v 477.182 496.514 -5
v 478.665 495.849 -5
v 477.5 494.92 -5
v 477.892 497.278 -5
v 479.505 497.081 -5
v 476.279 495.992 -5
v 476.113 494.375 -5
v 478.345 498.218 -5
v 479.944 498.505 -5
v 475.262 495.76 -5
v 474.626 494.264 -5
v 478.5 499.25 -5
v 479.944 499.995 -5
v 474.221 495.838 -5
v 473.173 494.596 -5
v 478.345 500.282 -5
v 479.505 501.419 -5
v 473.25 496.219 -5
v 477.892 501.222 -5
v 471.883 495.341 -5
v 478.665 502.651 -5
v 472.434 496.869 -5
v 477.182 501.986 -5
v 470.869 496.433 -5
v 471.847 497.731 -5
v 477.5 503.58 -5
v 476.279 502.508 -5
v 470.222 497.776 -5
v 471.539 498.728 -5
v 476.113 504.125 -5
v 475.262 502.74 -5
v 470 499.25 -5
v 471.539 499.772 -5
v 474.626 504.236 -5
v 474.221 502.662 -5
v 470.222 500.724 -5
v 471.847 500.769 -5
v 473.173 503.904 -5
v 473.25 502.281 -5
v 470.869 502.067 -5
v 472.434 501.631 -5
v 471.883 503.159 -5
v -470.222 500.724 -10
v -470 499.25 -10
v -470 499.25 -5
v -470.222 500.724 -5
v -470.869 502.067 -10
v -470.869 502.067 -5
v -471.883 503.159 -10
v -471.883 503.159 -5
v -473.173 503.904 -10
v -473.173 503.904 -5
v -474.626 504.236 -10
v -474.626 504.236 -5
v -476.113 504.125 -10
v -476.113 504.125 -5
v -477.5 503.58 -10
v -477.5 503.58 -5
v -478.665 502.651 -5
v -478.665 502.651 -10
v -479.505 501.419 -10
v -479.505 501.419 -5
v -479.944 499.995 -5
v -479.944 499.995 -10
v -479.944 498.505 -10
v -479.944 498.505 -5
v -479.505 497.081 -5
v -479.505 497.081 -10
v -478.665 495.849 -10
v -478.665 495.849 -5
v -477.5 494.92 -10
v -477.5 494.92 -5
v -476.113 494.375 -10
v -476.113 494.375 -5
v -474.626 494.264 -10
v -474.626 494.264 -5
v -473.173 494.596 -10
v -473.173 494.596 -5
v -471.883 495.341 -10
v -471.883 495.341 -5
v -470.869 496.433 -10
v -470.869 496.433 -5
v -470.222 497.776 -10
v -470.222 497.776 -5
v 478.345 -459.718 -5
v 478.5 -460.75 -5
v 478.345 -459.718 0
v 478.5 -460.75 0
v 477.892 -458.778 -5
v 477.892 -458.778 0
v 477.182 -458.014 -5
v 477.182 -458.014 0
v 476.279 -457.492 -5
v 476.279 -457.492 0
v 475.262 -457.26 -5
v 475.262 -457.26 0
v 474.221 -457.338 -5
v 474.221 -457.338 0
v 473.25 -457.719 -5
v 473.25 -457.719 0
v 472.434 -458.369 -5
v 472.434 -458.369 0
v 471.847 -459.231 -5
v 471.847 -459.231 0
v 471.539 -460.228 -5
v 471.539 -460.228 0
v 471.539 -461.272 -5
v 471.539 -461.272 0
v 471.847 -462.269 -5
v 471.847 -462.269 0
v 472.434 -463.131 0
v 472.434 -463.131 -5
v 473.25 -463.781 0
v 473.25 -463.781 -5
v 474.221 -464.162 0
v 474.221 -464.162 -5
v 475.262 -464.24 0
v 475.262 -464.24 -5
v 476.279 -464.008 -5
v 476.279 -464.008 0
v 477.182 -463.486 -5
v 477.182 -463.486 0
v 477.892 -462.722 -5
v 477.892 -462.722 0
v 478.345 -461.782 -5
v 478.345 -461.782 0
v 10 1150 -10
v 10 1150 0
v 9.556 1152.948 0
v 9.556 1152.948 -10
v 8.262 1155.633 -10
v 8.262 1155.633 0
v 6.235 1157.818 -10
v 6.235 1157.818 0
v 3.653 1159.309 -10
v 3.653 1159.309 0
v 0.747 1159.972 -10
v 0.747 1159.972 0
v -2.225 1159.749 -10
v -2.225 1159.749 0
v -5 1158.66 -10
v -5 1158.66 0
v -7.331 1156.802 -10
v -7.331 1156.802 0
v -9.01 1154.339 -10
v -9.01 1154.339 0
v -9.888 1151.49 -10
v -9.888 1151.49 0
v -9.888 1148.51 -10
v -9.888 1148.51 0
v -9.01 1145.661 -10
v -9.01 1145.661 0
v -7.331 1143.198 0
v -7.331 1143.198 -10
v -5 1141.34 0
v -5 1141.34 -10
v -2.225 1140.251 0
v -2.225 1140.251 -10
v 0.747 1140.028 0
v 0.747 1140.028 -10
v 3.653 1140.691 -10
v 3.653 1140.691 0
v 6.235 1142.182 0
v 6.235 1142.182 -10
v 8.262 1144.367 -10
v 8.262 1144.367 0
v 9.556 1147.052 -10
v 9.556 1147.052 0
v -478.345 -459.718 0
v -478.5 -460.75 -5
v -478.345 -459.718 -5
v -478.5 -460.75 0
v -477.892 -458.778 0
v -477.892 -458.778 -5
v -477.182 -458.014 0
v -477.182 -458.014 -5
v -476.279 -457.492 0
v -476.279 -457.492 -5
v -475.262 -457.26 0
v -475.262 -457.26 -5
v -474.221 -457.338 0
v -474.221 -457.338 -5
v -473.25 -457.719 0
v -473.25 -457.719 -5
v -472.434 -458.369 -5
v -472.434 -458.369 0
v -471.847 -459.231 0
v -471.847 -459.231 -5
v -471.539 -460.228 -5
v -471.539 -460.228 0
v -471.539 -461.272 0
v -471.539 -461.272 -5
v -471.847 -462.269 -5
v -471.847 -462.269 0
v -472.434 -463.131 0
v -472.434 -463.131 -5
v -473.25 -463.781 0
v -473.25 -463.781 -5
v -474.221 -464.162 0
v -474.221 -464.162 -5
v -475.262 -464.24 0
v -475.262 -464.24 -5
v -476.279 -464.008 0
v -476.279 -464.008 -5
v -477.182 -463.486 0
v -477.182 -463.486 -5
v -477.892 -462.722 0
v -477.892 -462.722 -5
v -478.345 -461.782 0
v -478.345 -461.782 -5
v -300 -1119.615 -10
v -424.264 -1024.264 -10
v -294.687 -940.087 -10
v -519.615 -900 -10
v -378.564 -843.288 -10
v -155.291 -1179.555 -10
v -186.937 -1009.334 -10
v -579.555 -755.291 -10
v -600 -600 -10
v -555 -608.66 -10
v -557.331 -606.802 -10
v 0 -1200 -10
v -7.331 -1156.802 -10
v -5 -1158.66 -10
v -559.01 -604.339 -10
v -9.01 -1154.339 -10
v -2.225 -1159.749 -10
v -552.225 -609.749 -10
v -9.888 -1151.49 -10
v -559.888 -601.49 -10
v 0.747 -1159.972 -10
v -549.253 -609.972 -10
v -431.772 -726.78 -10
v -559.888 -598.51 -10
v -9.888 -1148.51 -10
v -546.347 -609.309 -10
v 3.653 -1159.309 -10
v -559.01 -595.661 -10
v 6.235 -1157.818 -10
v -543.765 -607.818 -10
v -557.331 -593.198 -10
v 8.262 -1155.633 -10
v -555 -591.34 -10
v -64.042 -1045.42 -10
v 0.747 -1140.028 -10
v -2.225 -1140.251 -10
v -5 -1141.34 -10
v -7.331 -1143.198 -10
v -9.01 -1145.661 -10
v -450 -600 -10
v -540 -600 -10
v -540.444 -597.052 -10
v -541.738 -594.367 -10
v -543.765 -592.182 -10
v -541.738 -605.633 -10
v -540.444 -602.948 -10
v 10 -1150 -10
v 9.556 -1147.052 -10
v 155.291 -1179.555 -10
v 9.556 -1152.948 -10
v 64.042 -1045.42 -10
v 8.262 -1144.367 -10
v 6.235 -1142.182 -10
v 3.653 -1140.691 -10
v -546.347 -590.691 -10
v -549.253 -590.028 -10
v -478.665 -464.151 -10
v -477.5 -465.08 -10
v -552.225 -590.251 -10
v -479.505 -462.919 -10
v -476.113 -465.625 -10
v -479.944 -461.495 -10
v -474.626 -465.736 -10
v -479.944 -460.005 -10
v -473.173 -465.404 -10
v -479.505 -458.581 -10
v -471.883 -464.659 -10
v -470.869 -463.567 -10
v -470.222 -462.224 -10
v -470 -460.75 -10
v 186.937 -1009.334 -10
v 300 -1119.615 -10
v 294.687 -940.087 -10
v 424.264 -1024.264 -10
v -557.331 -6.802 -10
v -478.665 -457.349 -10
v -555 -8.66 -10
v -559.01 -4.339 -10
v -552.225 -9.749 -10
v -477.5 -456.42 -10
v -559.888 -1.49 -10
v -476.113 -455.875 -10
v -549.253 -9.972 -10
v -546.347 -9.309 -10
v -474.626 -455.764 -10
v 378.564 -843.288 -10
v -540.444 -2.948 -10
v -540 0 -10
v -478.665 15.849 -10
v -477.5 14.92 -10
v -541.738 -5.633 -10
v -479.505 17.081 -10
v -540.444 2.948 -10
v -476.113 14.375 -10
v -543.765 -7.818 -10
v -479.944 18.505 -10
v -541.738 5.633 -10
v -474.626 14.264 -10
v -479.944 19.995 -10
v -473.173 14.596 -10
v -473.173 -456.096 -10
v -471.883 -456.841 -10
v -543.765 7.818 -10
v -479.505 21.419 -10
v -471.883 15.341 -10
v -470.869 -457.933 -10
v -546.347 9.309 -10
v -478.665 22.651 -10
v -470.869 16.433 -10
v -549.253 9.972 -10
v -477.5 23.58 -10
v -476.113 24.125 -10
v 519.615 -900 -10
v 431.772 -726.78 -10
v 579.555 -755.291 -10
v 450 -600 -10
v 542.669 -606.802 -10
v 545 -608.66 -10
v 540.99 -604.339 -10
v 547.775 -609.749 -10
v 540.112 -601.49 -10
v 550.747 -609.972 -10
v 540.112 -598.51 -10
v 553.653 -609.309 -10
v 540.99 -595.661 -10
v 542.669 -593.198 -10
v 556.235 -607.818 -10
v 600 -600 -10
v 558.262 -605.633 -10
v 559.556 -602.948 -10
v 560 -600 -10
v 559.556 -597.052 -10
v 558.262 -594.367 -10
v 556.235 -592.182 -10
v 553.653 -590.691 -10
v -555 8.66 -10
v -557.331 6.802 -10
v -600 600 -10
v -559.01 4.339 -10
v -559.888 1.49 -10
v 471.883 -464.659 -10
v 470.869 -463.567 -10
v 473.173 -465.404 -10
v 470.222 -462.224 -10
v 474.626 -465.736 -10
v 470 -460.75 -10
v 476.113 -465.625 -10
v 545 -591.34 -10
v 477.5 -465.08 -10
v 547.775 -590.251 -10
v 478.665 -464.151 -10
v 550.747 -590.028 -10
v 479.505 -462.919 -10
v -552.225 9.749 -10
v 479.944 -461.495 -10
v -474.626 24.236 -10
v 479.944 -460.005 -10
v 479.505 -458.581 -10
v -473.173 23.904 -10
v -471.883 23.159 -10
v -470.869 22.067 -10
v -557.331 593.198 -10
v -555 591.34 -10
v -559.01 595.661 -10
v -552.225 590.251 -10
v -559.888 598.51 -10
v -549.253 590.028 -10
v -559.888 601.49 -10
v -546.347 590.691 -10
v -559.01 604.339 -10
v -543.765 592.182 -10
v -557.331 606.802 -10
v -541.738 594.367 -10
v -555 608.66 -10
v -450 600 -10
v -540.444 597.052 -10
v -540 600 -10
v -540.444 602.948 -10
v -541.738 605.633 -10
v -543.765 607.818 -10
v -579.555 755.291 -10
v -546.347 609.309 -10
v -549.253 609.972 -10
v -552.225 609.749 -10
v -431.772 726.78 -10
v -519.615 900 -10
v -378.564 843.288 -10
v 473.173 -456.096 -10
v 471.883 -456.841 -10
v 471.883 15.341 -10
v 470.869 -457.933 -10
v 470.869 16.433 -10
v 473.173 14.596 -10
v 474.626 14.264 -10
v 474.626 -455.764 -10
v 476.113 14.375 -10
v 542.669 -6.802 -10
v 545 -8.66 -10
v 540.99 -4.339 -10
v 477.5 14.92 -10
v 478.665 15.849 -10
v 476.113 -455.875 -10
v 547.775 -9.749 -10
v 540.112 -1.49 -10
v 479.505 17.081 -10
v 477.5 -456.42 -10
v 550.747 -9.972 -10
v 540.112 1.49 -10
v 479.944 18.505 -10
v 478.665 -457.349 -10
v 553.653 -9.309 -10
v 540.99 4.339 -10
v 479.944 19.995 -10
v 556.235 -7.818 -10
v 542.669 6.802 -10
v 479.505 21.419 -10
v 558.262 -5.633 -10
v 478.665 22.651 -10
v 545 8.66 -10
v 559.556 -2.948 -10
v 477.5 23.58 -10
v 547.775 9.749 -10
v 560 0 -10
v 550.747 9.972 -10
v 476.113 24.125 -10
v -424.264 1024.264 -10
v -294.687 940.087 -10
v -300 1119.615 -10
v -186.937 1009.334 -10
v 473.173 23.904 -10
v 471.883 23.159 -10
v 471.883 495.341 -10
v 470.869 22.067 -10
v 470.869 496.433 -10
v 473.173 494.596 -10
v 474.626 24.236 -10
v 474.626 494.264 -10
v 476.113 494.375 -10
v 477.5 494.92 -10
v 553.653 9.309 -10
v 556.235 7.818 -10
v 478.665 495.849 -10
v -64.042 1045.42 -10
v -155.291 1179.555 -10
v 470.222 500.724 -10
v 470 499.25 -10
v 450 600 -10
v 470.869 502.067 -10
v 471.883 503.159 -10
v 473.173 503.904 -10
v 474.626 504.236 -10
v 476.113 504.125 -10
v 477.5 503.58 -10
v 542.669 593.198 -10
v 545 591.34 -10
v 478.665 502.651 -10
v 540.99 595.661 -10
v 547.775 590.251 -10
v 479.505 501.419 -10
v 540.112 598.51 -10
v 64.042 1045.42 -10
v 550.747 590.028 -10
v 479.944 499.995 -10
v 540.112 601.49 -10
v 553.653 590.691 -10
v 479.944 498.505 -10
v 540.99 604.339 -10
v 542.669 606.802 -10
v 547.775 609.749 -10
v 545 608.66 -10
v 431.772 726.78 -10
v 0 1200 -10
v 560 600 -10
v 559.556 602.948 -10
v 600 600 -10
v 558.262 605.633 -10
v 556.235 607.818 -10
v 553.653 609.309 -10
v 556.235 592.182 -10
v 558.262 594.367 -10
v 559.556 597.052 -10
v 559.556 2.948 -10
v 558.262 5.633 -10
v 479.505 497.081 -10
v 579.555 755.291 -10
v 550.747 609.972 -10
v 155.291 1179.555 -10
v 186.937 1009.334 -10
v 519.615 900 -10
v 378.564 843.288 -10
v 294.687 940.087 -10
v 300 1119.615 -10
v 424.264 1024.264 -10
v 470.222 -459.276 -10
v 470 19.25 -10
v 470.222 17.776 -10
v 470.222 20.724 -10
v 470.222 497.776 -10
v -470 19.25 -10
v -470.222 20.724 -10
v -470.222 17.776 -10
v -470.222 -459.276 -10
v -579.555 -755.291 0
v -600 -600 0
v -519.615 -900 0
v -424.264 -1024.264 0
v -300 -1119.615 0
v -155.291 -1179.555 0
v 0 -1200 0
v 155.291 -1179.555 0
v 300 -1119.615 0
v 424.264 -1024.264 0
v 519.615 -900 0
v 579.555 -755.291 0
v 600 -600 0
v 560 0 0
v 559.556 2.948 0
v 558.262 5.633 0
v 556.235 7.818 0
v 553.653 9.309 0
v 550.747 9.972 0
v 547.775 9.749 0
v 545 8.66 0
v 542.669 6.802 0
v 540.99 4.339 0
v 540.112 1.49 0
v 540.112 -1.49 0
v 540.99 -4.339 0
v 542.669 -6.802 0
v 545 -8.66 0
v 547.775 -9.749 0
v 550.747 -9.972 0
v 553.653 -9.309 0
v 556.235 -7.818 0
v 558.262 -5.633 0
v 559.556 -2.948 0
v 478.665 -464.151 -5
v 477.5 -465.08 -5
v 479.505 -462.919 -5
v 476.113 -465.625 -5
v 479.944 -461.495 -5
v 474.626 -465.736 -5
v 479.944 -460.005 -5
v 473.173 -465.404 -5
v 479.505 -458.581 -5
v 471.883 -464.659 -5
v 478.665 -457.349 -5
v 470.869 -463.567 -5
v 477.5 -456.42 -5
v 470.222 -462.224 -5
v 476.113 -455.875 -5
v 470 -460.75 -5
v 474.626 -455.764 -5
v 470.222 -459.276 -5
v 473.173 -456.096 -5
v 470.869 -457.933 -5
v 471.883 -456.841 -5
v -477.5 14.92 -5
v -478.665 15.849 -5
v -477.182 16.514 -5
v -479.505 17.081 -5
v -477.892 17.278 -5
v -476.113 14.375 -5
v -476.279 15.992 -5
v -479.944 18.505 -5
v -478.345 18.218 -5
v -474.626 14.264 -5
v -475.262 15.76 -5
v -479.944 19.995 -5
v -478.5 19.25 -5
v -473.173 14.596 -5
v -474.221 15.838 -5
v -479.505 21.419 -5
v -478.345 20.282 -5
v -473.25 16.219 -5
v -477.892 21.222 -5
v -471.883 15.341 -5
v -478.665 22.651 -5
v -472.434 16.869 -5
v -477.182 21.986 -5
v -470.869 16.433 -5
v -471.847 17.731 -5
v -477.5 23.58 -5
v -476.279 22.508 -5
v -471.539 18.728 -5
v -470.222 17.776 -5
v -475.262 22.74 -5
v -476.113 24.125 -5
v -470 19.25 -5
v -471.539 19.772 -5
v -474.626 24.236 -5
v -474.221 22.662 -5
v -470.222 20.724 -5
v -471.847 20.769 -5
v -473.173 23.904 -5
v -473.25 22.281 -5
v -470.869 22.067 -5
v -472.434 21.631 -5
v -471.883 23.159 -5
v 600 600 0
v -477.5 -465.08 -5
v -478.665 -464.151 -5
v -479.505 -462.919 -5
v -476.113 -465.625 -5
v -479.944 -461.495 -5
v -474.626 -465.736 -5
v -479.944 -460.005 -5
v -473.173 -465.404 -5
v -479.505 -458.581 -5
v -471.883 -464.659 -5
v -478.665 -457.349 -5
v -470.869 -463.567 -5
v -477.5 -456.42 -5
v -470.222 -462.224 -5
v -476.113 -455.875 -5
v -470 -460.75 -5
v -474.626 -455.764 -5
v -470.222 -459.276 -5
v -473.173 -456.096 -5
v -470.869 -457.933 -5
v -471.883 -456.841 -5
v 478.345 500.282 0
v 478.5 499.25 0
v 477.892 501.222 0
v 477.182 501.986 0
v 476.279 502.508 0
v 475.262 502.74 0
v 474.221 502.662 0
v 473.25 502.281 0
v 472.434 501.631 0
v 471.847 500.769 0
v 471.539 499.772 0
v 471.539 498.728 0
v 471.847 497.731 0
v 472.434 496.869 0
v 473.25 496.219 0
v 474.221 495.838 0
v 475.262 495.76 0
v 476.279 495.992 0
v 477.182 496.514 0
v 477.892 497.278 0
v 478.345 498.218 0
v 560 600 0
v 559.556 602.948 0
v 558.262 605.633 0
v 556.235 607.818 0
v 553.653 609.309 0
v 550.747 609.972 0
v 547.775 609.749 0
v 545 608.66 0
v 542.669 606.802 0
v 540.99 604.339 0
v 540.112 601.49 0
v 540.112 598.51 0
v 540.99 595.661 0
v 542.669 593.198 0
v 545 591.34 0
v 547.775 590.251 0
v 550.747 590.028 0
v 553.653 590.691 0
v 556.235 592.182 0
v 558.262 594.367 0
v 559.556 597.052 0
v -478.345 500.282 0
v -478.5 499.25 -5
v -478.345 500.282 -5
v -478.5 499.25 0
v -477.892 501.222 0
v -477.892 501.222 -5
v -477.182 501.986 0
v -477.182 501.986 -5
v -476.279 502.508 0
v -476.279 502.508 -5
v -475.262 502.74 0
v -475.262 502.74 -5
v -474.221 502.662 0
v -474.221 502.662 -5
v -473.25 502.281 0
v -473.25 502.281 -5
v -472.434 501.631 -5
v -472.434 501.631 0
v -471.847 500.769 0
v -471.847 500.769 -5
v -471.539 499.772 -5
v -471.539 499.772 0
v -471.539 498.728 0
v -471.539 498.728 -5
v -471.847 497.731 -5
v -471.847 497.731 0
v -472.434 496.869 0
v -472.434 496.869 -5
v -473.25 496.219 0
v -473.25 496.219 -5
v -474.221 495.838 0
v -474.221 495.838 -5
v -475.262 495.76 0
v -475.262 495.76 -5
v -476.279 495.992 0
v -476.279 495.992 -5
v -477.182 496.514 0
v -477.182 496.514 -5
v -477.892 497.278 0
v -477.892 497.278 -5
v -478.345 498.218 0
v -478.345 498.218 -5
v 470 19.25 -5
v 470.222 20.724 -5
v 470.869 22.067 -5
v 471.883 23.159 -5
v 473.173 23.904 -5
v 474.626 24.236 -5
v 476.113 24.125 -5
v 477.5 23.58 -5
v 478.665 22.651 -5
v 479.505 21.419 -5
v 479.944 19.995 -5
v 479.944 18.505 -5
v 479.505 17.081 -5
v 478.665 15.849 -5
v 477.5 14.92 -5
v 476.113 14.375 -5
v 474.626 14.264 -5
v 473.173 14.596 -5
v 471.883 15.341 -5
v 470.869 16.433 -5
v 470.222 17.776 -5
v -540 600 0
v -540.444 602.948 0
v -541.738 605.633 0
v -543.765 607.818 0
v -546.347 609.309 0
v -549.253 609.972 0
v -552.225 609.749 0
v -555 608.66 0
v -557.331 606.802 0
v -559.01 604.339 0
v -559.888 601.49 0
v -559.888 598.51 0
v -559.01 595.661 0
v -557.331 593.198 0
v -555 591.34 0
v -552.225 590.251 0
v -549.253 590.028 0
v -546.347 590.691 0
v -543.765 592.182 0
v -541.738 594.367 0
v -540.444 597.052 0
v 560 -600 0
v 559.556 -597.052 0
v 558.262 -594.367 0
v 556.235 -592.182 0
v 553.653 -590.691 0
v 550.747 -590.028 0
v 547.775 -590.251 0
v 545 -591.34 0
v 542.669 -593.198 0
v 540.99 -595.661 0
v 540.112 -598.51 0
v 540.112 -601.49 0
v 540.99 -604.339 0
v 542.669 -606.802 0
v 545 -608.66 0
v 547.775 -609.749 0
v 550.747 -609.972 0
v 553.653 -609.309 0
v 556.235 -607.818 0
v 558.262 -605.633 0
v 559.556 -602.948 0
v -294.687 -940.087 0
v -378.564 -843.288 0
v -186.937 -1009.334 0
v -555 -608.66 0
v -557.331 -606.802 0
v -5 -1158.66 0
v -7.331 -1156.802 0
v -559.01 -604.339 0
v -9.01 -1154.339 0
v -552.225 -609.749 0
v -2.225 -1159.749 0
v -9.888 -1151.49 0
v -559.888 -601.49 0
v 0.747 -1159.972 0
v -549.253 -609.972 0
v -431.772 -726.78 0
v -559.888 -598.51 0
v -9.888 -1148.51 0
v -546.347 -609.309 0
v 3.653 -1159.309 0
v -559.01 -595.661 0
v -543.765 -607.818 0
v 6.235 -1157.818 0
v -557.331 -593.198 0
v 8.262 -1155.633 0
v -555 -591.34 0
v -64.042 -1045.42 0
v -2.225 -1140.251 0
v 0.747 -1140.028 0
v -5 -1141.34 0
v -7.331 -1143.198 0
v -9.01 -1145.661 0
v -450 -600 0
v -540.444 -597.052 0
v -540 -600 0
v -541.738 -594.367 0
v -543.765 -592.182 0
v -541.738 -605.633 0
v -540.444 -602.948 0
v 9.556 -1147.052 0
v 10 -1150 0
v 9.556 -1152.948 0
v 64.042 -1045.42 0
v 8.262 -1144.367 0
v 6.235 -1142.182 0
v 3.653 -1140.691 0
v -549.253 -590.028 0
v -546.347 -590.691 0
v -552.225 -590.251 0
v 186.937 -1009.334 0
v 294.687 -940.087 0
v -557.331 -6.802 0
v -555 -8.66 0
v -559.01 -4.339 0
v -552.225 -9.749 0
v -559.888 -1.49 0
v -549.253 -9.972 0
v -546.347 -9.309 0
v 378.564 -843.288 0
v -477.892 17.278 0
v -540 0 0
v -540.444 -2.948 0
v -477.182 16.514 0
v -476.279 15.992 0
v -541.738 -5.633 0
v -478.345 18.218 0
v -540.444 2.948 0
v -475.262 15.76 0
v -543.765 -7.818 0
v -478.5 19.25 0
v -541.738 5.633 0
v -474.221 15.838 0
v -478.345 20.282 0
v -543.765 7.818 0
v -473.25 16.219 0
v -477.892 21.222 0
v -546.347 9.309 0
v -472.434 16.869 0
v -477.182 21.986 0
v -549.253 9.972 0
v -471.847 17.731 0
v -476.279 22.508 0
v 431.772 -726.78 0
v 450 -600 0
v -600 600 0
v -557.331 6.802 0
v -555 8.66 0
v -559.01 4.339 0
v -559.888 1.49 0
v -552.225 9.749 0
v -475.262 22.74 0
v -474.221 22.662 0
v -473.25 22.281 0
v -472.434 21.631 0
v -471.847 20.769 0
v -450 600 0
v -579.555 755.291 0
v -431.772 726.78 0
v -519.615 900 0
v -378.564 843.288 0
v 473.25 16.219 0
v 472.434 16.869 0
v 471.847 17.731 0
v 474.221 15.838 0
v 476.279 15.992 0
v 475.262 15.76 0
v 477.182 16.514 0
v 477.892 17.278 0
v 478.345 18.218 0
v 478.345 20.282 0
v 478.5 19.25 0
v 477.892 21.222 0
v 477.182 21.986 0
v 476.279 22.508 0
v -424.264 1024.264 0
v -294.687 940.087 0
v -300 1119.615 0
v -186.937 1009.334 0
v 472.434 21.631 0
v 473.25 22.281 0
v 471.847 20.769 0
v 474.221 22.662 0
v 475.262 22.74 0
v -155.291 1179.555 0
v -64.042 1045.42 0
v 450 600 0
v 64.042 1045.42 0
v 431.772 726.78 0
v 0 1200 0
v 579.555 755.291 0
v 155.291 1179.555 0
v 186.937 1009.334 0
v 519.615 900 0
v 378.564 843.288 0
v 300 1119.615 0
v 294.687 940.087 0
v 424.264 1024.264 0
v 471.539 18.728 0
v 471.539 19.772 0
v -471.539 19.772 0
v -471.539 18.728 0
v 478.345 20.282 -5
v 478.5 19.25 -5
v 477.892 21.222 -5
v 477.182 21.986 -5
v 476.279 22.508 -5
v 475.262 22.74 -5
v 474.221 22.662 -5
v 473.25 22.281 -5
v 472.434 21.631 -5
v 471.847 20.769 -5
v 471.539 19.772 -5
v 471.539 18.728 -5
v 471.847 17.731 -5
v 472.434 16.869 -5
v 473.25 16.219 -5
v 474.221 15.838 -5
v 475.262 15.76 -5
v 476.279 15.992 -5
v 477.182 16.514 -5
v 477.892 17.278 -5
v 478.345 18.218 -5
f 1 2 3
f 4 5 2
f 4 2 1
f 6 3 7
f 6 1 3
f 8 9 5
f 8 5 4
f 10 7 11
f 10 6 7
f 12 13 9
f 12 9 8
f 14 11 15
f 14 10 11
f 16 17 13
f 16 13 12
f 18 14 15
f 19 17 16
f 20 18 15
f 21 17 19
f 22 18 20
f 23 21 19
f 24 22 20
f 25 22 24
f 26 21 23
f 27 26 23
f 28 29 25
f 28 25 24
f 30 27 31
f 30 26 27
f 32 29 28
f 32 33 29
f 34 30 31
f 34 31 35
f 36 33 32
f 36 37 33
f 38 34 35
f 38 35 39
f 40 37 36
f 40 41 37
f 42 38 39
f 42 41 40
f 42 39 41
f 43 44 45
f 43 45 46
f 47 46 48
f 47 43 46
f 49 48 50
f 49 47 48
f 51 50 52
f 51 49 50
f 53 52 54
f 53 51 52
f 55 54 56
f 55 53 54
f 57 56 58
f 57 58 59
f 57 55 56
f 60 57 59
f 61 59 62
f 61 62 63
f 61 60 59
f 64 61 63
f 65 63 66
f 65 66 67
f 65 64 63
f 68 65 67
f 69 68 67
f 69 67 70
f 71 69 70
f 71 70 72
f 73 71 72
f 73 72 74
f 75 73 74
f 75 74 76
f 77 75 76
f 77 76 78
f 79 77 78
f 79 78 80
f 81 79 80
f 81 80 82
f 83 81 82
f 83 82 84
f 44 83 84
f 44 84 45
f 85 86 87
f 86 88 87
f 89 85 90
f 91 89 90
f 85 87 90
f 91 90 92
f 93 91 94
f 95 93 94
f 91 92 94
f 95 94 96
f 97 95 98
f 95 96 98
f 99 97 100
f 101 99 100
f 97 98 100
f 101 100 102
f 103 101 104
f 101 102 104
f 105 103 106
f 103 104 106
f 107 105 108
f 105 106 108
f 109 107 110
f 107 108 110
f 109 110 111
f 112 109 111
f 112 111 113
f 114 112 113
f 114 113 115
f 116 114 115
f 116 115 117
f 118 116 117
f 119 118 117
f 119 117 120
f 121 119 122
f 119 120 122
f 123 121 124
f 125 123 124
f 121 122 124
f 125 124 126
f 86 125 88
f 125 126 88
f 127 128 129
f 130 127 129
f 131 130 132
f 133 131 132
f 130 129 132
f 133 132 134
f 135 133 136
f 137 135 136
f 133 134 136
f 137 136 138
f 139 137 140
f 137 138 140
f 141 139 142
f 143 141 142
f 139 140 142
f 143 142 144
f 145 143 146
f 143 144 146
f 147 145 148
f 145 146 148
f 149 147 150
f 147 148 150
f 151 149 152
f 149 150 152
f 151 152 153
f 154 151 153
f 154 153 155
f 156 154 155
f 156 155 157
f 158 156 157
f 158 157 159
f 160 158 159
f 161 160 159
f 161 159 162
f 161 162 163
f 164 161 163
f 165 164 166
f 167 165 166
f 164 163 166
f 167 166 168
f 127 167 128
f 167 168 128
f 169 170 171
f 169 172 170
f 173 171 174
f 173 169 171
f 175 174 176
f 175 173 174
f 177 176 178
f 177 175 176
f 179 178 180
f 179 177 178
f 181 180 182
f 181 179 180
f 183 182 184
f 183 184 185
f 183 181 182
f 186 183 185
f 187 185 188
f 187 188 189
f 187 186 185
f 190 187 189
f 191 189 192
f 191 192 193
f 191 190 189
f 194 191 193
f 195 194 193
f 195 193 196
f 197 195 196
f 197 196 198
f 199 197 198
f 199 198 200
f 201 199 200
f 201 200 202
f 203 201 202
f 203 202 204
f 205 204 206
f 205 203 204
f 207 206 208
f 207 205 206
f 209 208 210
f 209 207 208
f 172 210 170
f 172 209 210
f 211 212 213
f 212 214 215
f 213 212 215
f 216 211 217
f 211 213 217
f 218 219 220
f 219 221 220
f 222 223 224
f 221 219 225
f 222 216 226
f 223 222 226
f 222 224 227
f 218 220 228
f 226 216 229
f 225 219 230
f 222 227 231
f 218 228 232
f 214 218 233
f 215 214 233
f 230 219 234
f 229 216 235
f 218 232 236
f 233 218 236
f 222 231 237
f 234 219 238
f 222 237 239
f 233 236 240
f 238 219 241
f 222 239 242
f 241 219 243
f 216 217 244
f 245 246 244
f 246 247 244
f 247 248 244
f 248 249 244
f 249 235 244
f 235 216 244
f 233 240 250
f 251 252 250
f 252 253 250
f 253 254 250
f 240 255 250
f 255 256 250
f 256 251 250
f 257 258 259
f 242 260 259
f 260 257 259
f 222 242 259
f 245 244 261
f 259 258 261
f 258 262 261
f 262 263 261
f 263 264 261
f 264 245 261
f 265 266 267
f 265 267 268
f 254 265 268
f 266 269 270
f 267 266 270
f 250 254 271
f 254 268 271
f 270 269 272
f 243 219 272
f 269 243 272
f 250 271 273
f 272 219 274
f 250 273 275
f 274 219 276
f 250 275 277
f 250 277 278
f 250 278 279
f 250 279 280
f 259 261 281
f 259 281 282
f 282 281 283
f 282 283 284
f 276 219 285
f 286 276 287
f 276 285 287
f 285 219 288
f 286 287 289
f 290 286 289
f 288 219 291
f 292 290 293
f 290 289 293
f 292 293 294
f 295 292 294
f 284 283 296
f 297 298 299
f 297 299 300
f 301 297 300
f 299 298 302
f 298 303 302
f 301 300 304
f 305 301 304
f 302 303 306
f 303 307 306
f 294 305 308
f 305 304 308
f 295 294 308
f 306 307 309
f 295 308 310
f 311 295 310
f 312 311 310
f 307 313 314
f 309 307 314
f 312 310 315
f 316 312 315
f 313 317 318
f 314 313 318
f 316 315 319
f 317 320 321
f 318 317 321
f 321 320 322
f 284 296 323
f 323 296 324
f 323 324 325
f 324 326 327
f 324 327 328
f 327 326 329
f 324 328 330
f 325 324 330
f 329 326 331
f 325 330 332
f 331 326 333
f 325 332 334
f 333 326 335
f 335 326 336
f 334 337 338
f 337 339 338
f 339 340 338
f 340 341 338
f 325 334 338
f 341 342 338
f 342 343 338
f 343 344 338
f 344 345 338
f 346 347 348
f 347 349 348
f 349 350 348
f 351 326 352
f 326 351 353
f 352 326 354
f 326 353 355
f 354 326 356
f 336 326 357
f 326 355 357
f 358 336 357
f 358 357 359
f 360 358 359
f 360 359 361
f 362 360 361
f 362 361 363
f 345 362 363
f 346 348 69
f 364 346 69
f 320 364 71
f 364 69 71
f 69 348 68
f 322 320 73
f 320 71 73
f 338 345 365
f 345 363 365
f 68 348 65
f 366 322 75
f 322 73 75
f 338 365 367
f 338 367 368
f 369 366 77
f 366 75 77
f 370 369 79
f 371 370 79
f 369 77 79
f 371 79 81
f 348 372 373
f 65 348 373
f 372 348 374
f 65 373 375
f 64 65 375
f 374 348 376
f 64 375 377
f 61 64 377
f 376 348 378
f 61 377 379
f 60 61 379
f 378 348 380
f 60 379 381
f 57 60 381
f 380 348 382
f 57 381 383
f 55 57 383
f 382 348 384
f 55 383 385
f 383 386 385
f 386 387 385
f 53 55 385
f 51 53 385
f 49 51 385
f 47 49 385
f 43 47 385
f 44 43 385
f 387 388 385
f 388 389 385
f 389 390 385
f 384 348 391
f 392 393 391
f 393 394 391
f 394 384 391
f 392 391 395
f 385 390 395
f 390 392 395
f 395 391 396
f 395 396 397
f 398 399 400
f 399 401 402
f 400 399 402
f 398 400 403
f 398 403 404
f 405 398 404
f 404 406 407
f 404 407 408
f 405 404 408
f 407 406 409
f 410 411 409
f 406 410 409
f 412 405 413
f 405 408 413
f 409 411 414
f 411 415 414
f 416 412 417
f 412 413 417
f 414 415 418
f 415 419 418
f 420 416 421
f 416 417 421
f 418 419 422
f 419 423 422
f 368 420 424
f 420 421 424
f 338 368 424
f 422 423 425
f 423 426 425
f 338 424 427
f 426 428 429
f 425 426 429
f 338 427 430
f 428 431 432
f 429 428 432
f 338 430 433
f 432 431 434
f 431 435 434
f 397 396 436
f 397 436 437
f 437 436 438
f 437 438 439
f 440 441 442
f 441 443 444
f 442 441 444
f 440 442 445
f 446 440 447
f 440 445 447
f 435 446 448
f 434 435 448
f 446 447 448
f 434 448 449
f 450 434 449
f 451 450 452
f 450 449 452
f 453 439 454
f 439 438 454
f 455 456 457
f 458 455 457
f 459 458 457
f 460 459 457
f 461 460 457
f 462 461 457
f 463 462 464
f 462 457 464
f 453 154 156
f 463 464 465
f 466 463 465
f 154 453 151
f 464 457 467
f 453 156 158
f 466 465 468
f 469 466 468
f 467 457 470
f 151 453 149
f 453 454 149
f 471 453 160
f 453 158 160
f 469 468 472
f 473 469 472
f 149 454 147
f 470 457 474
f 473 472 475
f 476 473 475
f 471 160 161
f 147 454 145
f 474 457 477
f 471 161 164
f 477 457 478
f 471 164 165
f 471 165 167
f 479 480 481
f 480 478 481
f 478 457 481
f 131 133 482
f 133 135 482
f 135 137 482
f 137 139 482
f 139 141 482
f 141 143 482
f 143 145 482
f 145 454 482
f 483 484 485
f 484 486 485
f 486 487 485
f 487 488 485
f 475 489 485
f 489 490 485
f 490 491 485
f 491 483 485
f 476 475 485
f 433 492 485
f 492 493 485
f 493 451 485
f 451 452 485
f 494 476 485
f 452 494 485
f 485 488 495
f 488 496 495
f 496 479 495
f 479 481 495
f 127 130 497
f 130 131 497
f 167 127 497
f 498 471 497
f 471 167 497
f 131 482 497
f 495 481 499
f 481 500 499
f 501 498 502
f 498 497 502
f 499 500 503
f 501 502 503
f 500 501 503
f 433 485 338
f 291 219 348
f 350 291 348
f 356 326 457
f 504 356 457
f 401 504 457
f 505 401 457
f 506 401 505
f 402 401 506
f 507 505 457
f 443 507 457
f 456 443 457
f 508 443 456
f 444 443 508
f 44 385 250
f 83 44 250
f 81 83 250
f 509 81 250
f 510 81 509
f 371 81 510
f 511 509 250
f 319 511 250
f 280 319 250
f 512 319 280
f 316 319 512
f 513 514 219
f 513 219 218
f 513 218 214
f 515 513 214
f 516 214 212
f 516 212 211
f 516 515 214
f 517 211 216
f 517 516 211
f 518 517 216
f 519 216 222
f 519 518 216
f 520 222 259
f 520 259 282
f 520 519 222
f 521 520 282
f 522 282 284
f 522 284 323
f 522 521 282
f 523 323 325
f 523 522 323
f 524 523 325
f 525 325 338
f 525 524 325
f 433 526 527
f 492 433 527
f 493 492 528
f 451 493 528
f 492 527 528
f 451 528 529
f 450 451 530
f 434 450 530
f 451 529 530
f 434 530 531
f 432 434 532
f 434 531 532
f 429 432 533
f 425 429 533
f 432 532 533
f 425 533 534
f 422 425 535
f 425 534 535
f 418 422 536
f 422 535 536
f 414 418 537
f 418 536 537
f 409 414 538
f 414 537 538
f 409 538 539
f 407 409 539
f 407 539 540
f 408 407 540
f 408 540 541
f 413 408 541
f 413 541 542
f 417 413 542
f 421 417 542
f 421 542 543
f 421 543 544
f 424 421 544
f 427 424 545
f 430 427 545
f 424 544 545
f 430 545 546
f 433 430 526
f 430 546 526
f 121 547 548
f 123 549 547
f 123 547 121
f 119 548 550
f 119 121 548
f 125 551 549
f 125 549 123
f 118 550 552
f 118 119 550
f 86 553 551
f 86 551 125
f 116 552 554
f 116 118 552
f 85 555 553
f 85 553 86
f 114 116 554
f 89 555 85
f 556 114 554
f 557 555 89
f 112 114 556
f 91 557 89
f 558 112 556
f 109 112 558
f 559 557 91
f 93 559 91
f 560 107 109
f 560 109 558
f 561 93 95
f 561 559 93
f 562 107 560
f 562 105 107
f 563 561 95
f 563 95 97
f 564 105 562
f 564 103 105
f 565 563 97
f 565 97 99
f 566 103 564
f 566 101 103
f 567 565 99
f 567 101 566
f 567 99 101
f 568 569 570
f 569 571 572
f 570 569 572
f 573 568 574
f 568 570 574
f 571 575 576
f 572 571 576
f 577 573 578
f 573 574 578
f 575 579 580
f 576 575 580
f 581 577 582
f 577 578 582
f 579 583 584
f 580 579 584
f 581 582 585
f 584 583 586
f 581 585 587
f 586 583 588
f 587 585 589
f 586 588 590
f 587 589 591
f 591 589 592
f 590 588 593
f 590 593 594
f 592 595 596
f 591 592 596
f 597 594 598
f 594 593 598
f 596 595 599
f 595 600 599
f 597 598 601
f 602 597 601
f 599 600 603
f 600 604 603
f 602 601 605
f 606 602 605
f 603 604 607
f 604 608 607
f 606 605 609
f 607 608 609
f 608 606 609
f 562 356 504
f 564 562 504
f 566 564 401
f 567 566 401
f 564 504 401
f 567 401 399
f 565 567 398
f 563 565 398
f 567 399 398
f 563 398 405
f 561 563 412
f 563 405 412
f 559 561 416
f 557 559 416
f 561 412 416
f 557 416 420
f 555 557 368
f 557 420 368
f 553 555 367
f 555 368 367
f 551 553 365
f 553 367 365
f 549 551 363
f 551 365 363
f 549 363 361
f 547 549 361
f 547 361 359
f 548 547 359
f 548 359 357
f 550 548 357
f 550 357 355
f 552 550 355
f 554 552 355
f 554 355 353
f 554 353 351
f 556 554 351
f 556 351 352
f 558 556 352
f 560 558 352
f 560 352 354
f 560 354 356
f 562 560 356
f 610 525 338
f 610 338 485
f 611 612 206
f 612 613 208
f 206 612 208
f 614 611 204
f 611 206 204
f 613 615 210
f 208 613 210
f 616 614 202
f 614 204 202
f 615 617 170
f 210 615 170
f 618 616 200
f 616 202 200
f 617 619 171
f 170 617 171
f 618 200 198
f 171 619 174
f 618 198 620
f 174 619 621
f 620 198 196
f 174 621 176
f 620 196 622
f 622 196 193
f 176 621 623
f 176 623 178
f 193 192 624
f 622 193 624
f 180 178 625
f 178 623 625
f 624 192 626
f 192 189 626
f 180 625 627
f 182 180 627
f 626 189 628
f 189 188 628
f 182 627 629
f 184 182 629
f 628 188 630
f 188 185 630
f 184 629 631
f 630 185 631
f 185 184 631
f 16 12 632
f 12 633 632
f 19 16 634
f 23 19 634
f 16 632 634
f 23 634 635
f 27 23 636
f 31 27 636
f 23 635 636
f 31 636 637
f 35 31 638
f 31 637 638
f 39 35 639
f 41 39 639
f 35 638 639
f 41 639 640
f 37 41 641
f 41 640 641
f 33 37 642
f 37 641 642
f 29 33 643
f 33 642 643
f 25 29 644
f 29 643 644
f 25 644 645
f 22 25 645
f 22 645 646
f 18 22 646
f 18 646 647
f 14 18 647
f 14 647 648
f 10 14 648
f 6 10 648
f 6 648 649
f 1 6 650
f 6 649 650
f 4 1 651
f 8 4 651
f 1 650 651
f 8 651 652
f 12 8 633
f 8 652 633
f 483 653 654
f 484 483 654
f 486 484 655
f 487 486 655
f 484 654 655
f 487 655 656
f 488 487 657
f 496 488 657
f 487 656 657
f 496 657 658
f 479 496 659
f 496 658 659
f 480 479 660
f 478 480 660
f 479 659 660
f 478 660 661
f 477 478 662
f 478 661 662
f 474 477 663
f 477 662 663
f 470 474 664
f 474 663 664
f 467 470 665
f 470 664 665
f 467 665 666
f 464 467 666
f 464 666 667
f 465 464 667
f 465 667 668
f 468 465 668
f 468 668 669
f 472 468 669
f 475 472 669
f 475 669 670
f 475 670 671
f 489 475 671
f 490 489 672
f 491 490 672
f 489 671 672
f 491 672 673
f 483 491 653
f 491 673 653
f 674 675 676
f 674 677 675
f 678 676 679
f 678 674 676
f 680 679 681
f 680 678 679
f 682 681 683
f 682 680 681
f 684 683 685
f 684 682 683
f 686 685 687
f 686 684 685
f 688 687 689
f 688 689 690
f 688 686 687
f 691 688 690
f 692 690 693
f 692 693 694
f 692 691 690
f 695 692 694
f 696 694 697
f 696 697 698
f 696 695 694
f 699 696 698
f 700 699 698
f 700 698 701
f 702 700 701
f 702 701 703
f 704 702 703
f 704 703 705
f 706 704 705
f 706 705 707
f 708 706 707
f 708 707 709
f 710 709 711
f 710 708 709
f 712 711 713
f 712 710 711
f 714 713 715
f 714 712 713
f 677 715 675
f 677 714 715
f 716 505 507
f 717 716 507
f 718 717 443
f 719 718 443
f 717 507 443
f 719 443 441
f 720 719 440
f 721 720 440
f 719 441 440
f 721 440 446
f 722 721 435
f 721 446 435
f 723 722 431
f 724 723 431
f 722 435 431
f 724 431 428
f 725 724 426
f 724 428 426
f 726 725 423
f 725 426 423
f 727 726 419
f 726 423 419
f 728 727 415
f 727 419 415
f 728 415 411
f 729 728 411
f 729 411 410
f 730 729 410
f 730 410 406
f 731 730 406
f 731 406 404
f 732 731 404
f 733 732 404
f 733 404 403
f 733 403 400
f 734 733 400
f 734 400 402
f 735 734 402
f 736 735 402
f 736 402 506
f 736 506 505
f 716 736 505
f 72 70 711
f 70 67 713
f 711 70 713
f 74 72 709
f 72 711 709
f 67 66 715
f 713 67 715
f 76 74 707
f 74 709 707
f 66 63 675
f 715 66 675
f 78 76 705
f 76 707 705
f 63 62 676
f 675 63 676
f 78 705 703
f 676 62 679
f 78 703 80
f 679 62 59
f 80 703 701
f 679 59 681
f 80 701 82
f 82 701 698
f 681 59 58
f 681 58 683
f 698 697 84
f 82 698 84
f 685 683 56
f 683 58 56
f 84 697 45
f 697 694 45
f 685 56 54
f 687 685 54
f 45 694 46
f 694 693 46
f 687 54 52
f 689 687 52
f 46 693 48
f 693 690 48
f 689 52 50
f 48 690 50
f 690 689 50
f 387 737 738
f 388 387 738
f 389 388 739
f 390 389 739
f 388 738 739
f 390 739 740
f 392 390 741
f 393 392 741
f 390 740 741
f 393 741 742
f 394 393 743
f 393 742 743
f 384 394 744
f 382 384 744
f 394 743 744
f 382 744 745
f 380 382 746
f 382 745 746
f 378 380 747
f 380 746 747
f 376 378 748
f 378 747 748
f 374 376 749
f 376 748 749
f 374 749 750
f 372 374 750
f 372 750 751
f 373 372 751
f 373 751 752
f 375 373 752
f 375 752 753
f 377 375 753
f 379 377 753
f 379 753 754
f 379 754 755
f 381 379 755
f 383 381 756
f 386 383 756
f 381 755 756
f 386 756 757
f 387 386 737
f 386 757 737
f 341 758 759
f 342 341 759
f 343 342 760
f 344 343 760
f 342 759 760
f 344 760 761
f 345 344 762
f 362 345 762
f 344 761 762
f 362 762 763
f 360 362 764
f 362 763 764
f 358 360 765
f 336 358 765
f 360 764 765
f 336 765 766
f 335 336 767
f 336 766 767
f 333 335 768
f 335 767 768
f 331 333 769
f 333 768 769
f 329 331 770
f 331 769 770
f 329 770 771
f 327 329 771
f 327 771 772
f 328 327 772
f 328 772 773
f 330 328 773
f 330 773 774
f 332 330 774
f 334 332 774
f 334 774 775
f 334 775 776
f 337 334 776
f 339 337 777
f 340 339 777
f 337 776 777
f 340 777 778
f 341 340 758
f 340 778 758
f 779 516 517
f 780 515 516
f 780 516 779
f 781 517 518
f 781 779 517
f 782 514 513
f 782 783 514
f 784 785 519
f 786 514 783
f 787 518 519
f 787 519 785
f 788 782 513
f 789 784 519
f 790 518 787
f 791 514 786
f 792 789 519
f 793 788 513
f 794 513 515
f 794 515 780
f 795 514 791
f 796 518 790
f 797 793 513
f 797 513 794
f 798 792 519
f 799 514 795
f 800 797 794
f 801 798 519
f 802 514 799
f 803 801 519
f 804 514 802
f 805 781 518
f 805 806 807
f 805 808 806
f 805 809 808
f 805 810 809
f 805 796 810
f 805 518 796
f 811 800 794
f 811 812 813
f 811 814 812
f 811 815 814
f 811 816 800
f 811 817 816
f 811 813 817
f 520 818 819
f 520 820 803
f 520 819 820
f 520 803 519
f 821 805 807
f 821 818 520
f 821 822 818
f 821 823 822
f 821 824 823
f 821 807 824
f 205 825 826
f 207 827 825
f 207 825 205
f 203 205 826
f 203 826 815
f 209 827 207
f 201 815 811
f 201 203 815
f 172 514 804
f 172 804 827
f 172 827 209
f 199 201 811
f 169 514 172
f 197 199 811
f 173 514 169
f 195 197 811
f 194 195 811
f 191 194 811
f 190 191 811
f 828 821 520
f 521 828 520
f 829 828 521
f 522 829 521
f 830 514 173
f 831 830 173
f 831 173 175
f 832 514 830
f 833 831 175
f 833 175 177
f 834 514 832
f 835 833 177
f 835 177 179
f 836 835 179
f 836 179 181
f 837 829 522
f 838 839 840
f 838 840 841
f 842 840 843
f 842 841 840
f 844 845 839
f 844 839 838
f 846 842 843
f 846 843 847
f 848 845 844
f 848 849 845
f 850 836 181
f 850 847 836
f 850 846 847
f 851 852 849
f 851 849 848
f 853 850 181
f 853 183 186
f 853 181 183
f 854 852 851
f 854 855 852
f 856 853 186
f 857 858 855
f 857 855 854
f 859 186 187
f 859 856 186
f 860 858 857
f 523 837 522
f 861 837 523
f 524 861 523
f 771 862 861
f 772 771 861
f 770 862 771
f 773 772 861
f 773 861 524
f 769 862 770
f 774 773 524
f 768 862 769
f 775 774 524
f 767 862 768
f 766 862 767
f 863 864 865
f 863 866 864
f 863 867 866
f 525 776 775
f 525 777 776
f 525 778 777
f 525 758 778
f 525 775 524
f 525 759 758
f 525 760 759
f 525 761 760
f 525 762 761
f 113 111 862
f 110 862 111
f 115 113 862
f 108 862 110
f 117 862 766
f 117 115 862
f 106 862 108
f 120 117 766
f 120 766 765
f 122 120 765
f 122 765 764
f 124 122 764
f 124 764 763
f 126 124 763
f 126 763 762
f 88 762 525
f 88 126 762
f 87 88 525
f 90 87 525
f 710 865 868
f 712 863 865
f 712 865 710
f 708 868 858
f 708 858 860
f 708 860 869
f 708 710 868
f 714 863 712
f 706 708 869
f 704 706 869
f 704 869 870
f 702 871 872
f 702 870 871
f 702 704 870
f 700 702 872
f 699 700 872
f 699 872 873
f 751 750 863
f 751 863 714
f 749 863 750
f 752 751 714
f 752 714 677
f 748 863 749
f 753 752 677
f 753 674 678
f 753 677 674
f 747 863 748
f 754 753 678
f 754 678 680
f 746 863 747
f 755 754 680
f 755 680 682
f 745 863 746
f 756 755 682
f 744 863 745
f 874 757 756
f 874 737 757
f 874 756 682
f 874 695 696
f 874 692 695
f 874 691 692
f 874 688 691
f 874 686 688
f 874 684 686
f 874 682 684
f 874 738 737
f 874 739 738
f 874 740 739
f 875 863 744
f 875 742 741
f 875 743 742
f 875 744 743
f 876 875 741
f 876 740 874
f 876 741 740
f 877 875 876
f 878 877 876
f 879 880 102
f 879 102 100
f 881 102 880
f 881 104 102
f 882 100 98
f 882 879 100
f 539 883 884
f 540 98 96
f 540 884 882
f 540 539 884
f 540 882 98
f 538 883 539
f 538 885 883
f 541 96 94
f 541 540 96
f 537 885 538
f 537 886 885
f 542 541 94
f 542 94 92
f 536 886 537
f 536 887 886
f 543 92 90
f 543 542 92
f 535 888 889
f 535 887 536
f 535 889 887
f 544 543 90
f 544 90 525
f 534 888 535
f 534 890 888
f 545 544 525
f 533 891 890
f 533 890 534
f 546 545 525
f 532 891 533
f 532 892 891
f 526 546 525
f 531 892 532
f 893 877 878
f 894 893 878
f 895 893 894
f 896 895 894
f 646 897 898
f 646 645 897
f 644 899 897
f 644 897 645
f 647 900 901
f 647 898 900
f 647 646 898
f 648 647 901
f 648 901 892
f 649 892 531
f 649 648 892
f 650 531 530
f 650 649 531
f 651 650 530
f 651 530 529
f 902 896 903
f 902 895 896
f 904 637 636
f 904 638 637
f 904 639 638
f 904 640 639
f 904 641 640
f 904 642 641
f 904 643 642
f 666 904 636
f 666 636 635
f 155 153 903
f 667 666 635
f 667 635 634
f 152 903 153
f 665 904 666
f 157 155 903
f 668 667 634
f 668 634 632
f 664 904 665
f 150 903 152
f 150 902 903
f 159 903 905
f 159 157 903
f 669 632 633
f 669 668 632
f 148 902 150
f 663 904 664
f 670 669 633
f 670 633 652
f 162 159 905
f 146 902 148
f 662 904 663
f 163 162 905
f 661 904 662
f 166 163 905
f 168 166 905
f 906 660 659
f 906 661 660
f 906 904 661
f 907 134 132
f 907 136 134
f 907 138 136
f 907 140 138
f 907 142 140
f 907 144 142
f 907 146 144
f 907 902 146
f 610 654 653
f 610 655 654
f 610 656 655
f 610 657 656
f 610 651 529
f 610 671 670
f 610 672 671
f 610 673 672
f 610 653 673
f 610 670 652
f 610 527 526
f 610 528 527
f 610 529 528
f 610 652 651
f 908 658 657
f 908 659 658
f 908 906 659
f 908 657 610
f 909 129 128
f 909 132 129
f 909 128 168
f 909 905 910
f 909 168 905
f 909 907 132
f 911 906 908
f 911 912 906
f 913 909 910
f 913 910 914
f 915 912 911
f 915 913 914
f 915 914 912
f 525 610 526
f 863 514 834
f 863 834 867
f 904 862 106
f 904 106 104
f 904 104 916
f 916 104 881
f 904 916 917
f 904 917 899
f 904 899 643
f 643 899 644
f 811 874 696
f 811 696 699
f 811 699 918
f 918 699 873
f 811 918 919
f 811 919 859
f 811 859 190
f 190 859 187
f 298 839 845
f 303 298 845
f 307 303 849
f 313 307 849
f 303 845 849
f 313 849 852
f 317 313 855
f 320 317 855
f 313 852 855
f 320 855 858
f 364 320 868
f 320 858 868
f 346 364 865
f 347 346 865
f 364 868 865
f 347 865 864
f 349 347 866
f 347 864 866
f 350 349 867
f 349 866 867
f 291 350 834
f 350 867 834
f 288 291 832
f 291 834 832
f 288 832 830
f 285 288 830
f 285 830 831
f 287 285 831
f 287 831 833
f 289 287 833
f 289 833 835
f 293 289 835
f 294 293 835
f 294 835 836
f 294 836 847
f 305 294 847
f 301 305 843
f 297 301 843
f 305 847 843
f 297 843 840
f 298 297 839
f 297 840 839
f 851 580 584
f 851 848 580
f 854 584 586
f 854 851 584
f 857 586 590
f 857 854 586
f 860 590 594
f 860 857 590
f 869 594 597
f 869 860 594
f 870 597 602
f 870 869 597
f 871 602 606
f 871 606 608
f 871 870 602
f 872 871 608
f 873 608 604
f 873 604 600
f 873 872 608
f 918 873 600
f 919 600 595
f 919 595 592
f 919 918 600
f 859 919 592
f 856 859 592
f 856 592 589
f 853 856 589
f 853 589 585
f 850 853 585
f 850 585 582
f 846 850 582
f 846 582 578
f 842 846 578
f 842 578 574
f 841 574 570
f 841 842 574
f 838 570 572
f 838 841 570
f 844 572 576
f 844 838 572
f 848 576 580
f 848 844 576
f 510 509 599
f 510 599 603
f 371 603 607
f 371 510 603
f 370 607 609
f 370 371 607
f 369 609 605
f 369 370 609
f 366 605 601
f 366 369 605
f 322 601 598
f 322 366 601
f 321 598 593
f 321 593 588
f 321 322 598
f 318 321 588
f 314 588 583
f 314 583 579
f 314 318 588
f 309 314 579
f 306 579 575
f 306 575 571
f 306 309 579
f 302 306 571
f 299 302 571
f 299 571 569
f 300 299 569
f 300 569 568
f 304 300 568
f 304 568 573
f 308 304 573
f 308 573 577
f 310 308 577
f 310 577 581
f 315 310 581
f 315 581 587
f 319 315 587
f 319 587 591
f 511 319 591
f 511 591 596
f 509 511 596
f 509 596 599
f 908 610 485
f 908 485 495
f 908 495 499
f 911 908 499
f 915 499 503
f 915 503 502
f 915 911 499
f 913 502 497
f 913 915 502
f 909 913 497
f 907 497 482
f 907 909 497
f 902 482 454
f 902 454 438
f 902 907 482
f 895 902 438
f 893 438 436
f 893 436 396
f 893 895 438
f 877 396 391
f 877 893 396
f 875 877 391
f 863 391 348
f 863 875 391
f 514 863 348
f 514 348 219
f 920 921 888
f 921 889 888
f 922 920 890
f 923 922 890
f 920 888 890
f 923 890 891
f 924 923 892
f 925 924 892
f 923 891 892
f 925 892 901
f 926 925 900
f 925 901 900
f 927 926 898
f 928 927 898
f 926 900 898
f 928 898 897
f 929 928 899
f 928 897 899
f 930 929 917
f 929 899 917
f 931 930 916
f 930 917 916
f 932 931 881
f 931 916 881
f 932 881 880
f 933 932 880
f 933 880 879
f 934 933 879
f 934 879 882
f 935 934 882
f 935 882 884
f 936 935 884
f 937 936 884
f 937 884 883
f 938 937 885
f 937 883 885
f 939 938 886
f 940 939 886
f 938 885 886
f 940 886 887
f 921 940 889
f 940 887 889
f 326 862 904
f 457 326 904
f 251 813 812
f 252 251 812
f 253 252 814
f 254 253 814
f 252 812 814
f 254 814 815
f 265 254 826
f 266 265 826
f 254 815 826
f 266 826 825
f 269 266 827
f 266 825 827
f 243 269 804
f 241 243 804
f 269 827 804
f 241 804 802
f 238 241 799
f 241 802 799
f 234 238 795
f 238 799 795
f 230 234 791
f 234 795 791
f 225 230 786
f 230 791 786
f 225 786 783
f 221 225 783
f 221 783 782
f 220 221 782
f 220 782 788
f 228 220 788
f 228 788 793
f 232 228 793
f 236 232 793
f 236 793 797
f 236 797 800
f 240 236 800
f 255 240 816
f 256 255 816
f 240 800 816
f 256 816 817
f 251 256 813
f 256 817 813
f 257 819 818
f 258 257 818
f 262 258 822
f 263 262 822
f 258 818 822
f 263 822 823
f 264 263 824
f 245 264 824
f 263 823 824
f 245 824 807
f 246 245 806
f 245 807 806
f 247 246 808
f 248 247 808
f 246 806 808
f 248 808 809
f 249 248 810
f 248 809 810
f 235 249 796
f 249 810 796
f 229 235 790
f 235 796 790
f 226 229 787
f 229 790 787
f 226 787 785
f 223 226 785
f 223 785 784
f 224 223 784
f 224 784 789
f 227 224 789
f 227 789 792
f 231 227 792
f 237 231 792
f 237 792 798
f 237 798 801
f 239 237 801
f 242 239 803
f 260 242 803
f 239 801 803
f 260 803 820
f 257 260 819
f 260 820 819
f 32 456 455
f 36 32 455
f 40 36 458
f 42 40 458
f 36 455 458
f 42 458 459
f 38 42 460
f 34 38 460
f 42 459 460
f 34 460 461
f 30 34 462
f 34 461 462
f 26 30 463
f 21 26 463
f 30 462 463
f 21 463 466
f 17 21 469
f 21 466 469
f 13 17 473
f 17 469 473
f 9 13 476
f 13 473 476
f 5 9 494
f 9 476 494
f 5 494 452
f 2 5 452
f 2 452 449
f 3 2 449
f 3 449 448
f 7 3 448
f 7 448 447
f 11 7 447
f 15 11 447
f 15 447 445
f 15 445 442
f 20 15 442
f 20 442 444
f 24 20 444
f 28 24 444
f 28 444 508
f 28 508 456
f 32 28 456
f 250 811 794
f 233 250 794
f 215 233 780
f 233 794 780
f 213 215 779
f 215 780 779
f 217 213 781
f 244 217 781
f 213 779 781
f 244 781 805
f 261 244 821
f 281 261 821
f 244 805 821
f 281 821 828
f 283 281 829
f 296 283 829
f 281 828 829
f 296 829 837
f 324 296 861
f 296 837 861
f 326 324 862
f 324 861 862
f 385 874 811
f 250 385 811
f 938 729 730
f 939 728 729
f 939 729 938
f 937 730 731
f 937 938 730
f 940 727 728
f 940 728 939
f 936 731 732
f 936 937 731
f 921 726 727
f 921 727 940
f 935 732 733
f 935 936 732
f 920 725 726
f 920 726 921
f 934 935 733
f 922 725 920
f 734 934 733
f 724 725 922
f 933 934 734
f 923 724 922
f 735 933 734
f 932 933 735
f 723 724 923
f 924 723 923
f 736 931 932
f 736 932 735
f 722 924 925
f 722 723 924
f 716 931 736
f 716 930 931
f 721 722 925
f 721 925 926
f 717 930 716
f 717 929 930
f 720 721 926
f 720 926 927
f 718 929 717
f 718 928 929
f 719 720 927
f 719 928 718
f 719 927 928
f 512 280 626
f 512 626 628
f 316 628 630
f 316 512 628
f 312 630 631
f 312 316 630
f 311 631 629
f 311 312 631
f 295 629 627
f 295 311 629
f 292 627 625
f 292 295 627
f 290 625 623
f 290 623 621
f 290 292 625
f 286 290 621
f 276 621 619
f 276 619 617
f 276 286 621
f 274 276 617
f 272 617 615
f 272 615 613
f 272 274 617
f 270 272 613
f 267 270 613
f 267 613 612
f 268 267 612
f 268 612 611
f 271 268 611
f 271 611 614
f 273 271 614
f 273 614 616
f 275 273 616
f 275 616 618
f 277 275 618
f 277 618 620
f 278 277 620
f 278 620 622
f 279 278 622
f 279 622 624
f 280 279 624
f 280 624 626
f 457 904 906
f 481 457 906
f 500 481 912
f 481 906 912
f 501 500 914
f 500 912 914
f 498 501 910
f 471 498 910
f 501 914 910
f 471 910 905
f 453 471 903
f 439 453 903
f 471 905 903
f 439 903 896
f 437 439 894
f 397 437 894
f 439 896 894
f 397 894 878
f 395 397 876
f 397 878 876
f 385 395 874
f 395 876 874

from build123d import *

# Parameters (mm, degrees)
SKETCH1_R           = 10
BOSS_EXTRUDE1_DEPTH = 10
HOLE2_D             = 7
HOLE2_CBORE_D       = 10
HOLE2_CBORE_DEPTH   = 5


with BuildPart() as part:
    # Sketch1 → Boss-Extrude1 (new body)
    with BuildSketch(Plane.XY):
        with BuildLine():
            Line((600, -600), (600, 600))
            ThreePointArc((600, 600), (0, 1200), (-600, 600))
            Line((-600, 600), (-600, -600))
            ThreePointArc((-600, -600), (0, -1200), (600, -600))
        make_face()
        with Locations((0, 1150)):
            Circle(SKETCH1_R, mode=Mode.SUBTRACT)
        with Locations((-550, 600)):
            Circle(SKETCH1_R, mode=Mode.SUBTRACT)
        with Locations((-550, 0)):
            Circle(SKETCH1_R, mode=Mode.SUBTRACT)
        with Locations((-550, -600)):
            Circle(SKETCH1_R, mode=Mode.SUBTRACT)
        with Locations((550, 600)):
            Circle(SKETCH1_R, mode=Mode.SUBTRACT)
        with Locations((550, 0)):
            Circle(SKETCH1_R, mode=Mode.SUBTRACT)
        with Locations((550, -600)):
            Circle(SKETCH1_R, mode=Mode.SUBTRACT)
        with Locations((0, -1150)):
            Circle(SKETCH1_R, mode=Mode.SUBTRACT)
        with BuildLine():
            Line((450, -600), (450, 600))
            ThreePointArc((450, 600), (0, 1050), (-450, 600))
            Line((-450, 600), (-450, -600))
            ThreePointArc((-450, -600), (0, -1050), (450, -600))
        make_face(mode=Mode.SUBTRACT)
    extrude(amount=-BOSS_EXTRUDE1_DEPTH)

    # Hole2 (through all)
    with Locations(Plane(origin=(475, 19.25, -10), x_dir=(-1, 0, 0), z_dir=(0, 0, -1))):
        with Locations((0, 0), (0, 480), (0, -480)):
            hole2 = CounterBoreHole(HOLE2_D / 2, HOLE2_CBORE_D / 2, HOLE2_CBORE_DEPTH)

    # Mirror1: Hole2 across plane
    add(hole2.mirror(Plane(origin=(0, 0, 0), x_dir=(0, 0, 1), z_dir=(1, 0, 0))), mode=Mode.SUBTRACT)


solid = part.part
